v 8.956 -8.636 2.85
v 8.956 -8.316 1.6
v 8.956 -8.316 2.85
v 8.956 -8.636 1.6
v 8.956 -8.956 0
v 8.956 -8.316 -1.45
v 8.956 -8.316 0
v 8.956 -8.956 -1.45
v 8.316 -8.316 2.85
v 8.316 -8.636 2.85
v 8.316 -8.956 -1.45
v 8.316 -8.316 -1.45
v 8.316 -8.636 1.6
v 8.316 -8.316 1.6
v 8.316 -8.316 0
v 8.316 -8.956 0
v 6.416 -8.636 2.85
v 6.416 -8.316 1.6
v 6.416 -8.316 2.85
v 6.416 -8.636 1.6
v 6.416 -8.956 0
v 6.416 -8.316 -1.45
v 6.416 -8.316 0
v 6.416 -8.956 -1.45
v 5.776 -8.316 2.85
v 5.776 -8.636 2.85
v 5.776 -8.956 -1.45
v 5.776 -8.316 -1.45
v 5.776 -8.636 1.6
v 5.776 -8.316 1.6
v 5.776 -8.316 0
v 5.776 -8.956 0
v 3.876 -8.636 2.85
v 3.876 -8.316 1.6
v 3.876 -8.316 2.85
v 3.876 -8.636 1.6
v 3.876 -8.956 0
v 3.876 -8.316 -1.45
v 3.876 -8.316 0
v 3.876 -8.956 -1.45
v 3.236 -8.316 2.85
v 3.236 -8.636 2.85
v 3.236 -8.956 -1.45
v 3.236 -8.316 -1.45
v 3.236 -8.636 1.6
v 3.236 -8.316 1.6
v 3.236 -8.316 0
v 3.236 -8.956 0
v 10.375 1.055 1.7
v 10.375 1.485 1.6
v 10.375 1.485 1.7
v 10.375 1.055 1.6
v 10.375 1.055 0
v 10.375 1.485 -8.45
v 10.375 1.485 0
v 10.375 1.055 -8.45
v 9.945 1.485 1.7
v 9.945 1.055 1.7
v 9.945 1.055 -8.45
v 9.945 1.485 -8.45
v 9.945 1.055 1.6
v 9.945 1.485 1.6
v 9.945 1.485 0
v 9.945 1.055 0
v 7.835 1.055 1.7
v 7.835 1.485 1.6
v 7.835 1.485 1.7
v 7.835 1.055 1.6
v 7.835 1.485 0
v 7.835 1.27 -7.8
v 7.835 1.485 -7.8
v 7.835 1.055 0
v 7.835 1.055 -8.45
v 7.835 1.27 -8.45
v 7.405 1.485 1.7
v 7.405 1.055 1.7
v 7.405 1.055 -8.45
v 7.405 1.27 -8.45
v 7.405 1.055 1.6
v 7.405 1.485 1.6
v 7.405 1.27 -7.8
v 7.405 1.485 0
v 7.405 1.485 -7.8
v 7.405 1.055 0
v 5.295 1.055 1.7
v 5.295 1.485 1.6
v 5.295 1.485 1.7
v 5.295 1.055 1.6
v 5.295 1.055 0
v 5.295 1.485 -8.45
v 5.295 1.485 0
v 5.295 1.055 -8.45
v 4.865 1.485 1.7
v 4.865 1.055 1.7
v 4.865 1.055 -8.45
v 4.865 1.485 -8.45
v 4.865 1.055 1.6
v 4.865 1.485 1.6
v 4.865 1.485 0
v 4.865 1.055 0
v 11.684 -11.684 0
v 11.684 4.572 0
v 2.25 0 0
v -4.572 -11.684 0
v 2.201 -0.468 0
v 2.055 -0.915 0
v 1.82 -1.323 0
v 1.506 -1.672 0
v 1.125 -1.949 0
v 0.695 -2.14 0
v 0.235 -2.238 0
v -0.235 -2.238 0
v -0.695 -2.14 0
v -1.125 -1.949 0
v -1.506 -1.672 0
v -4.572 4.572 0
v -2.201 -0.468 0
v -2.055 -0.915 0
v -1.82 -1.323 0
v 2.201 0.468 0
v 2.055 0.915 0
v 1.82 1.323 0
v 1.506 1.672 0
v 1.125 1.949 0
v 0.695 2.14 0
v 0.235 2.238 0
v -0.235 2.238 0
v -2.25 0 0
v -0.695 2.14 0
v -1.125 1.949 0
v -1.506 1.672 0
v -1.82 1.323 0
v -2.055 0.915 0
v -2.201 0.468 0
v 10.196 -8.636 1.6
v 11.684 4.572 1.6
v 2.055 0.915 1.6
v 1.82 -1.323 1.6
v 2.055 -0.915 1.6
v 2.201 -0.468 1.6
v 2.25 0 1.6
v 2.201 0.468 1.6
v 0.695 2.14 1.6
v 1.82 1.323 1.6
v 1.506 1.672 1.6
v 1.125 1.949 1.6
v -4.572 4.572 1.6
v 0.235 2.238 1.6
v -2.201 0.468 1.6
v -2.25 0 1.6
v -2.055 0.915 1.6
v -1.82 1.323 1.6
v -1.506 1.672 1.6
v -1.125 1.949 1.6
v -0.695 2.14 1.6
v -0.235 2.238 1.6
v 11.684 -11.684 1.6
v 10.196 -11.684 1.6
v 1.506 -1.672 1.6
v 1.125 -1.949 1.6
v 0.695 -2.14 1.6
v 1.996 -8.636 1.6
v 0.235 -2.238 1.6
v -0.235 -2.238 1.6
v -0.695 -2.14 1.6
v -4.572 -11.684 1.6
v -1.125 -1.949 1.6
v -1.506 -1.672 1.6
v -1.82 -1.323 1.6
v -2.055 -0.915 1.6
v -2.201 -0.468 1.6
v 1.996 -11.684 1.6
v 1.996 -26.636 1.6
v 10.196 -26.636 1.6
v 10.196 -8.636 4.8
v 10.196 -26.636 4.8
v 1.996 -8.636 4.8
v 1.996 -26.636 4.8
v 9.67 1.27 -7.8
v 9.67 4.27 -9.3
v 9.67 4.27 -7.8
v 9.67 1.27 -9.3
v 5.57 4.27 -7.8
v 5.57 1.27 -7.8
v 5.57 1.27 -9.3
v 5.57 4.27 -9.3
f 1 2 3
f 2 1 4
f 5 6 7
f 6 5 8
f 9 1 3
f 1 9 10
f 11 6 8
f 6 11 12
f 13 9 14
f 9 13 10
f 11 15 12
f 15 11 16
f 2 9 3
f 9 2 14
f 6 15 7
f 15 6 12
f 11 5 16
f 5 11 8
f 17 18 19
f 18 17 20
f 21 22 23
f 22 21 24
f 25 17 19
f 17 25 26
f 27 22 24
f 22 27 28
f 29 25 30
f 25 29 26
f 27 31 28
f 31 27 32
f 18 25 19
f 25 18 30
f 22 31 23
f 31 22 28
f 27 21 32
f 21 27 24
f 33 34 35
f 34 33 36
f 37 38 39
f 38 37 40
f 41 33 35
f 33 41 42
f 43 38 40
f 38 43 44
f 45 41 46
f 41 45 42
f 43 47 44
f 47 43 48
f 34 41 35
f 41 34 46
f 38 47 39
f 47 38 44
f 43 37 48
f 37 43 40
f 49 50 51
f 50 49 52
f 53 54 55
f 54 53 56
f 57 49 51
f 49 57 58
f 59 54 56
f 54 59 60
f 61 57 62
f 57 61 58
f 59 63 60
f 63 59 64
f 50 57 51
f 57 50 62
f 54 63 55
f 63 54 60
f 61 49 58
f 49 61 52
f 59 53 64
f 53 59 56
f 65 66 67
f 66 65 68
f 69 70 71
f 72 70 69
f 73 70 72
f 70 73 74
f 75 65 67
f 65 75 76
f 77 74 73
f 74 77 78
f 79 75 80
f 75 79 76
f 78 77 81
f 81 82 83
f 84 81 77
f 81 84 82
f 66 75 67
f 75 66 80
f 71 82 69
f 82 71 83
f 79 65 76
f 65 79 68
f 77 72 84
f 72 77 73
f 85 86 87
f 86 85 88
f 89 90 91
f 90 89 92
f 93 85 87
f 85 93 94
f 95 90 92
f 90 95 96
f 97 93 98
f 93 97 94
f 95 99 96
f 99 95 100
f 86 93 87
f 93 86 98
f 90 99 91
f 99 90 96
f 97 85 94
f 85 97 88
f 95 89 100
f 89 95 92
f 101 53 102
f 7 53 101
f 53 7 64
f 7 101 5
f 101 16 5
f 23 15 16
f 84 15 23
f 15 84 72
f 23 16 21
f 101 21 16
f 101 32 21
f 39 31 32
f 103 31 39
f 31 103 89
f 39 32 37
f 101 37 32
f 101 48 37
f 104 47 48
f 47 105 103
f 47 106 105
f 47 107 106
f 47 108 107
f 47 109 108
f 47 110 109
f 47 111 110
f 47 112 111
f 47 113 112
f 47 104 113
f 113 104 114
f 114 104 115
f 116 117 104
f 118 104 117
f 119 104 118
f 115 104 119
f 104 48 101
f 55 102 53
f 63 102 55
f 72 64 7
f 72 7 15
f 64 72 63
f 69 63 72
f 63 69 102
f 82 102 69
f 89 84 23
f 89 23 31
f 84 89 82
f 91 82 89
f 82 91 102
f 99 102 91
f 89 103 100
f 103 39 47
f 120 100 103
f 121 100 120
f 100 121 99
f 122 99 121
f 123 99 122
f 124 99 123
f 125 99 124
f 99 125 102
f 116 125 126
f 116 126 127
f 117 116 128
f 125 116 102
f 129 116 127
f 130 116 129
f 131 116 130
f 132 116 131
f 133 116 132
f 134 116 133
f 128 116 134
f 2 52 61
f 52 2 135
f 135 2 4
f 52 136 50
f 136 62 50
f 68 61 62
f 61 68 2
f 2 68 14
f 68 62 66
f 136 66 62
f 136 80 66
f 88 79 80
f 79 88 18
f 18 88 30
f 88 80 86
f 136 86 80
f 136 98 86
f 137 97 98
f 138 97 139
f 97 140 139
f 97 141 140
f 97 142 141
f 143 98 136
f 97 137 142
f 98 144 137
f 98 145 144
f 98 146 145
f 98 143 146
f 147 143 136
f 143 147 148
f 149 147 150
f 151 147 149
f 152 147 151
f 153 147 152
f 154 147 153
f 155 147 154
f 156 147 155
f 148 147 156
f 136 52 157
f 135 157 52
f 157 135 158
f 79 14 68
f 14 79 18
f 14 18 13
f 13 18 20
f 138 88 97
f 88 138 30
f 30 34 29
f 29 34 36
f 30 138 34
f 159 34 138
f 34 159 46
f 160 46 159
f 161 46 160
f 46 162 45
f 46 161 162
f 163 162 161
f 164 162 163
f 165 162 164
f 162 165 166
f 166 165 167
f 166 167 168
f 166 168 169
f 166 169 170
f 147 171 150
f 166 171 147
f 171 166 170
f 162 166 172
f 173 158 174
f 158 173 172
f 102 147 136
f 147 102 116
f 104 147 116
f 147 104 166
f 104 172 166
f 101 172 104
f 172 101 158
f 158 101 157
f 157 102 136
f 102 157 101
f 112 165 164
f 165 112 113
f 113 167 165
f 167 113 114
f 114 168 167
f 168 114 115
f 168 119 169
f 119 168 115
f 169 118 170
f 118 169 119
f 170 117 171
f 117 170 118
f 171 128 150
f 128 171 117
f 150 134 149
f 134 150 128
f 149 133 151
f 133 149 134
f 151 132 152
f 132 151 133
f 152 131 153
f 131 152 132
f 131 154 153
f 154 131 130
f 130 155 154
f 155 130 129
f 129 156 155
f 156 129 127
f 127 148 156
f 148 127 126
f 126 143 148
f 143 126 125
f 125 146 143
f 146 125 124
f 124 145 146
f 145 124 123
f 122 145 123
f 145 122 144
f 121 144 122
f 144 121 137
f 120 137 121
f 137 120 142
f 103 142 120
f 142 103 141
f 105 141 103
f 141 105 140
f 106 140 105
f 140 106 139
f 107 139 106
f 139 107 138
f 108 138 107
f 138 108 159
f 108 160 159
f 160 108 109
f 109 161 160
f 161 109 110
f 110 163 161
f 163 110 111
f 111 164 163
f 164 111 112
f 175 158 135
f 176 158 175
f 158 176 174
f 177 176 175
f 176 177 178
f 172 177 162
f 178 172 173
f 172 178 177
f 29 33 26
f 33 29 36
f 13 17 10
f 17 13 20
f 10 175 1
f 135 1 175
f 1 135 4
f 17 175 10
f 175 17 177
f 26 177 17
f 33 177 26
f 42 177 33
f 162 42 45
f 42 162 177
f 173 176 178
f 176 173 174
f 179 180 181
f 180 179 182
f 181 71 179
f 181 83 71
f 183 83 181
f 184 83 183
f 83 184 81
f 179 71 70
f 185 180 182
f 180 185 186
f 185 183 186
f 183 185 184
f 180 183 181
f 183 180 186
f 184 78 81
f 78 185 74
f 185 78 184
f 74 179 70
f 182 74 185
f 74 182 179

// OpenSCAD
// file: 801f8c8ad5252d830007bc8fb8f76d3168990c0b1102200be74383be07b724a8.scad
/*
   Copyright 2018 Scott Bezek and the splitflap contributors

   Licensed under the Apache License, Version 2.0 (the "License");
   you may not use this file except in compliance with the License.
   You may obtain a copy of the License at

       http://www.apache.org/licenses/LICENSE-2.0

   Unless required by applicable law or agreed to in writing, software
   distributed under the License is distributed on an "AS IS" BASIS,
   WITHOUT WARRANTIES OR CONDITIONS OF ANY KIND, either express or implied.
   See the License for the specific language governing permissions and
   limitations under the License.
*/

include <3a8aa1ee2c5f15af7c9a4d3d95d6786cd3b11c8e1af2661494beaac4b8dd79fa.scad>;

pcb_thickness = 1.6;
sensor_spool_distance = 0.70;  // distance from the sensor to the face of the spool

// From datasheet:
hall_effect_height = (2.8 + 3.2) / 2;
hall_effect_width = (3.9 + 4.3) / 2;
hall_effect_thickness = (1.40 + 1.60) / 2;
hall_effect_sensor_offset_y = hall_effect_height - 1.25;
hall_effect_pin_length_max = 14.5;

// From sensor.kicad_pcb:
pcb_height = 16.256;
pcb_length = 16.256;
pcb_hole_to_sensor_pin_1_x = 10.16;
pcb_hole_to_sensor_pin_1_y = 1.27;
sensor_pin_pitch = 2.54;
pcb_hole_to_connector_pin_1_x = 8.636;
pcb_hole_to_connector_pin_1_y = 8.636;
connector_pin_pitch = 2.54;
pcb_edge_to_hole_x = 4.572;
pcb_edge_to_hole_y = 4.572;

pcb_adjustment_range = 4;
pcb_hole_radius = m4_hole_diameter/2;

// Jig dimensions
pcb_jig_corner_fillet = 2;
pcb_jig_align_thickness = 2;
pcb_jig_align_length = 0;  // past the PCB thickness
pcb_jig_align_clearance = 0.25;  // on x, around the PCB
pcb_jig_depth_clearance = 0.1;  // on y, from sensor to jig


// Computed dimensions
pcb_hole_to_sensor_x = pcb_hole_to_sensor_pin_1_x - sensor_pin_pitch;
pcb_hole_to_sensor_y = pcb_hole_to_sensor_pin_1_y + hall_effect_sensor_offset_y;


// Rough numbers for 3d rendering only (non-critical dimensions)
pcb_connector_height = 3.2;
pcb_connector_width = 8.2;
pcb_connector_length = 18;
pcb_connector_pin_width = 0.64;
pcb_connector_pin_slop = 0.4;
pcb_connector_pin_tail_length = 3.05 + 2.5/2;

pcb_sensor_pin_width = 0.43;

module color_extractor(c) {
    echo(extracted_color=c);
    children();
}
// file: 3a8aa1ee2c5f15af7c9a4d3d95d6786cd3b11c8e1af2661494beaac4b8dd79fa.scad
/*
   Copyright 2015-2018 Scott Bezek and the splitflap contributors

   Licensed under the Apache License, Version 2.0 (the "License");
   you may not use this file except in compliance with the License.
   You may obtain a copy of the License at

       http://www.apache.org/licenses/LICENSE-2.0

   Unless required by applicable law or agreed to in writing, software
   distributed under the License is distributed on an "AS IS" BASIS,
   WITHOUT WARRANTIES OR CONDITIONS OF ANY KIND, either express or implied.
   See the License for the specific language governing permissions and
   limitations under the License.
*/

// M4 bolts
m4_hole_diameter = 4.5;
m4_bolt_length = 10;
m4_button_head_diameter = 7.6 + .2;
m4_button_head_length = 2.2 + .2;
m4_nut_width_flats = 7 + .2;
m4_nut_width_corners = 7/cos(180/6);
m4_nut_width_corners_padded = m4_nut_width_corners + .2;
m4_nut_length = 3.2;
m4_nut_length_padded = m4_nut_length + .2;


module color_extractor(c) {
    echo(extracted_color=c);
    children();
}
// main file
/*
   Copyright 2015-2018 Scott Bezek and the splitflap contributors

   Licensed under the Apache License, Version 2.0 (the "License");
   you may not use this file except in compliance with the License.
   You may obtain a copy of the License at

       http://www.apache.org/licenses/LICENSE-2.0

   Unless required by applicable law or agreed to in writing, software
   distributed under the License is distributed on an "AS IS" BASIS,
   WITHOUT WARRANTIES OR CONDITIONS OF ANY KIND, either express or implied.
   See the License for the specific language governing permissions and
   limitations under the License.
*/
include <3a8aa1ee2c5f15af7c9a4d3d95d6786cd3b11c8e1af2661494beaac4b8dd79fa.scad>;
include <801f8c8ad5252d830007bc8fb8f76d3168990c0b1102200be74383be07b724a8.scad>;


module pcb_outline_2d(hole=true) {
    difference() {
        translate([-pcb_edge_to_hole_x, -pcb_height + pcb_edge_to_hole_y]) {
            square([pcb_length, pcb_height]);
        }
        if(hole) {
            circle(r=m4_hole_diameter/2, $fn=30);
        }
    }
}

// 3D PCB module, origin at the center of the mounting hole on the bottom surface of the PCB
module pcb(pcb_to_spool, render_jig=false, jig_thickness=0) {
     color_extractor([0, 0.5, 0]) {
        linear_extrude(height=pcb_thickness) {
            pcb_outline_2d();
        }
    }

    // Connector
     color_extractor([0, 0, 0]) {
        translate([pcb_hole_to_connector_pin_1_x - connector_pin_pitch - pcb_connector_width/2, -pcb_hole_to_connector_pin_1_y - pcb_connector_length, pcb_thickness]) {
            cube([pcb_connector_width, pcb_connector_length, pcb_connector_height]);
        }
    }

    // Connector pins
     color_extractor([0.5, 0.5, 0.5]) {
        translate([pcb_hole_to_connector_pin_1_x - pcb_connector_pin_width/2, -pcb_hole_to_connector_pin_1_y - pcb_connector_pin_width/2, -pcb_connector_pin_tail_length + pcb_thickness + 2.5/2]) {
            cube([pcb_connector_pin_width, pcb_connector_pin_width, pcb_connector_pin_tail_length]);
            translate([-connector_pin_pitch, 0, 0]) {
                cube([pcb_connector_pin_width, pcb_connector_pin_width, pcb_connector_pin_tail_length]);
            }
            translate([-connector_pin_pitch * 2, 0, 0]) {
                cube([pcb_connector_pin_width, pcb_connector_pin_width, pcb_connector_pin_tail_length]);
            }
        }
    }

    // Sensor pins
     color_extractor([0.5, 0.5, 0.5]) {
        pin_extra_length = 0.1;  // pins excess sticking out from the back of the PCB
        sensor_z_offset = pcb_to_spool - sensor_spool_distance - hall_effect_thickness/2 - 0.1;
        sensor_pin_length = sensor_z_offset + pcb_thickness + pin_extra_length;
        assert(sensor_pin_length < hall_effect_pin_length_max, "Warning: design is too thick to fit sensor");

        translate([pcb_hole_to_sensor_pin_1_x - pcb_sensor_pin_width/2, pcb_hole_to_sensor_pin_1_y - pcb_sensor_pin_width/2, -sensor_z_offset]) {
            cube([pcb_sensor_pin_width, pcb_sensor_pin_width, sensor_pin_length]);
            translate([-sensor_pin_pitch, 0, 0]) {
                cube([pcb_sensor_pin_width, pcb_sensor_pin_width, sensor_pin_length]);
            }
            translate([-sensor_pin_pitch * 2, 0, 0]) {
                cube([pcb_sensor_pin_width, pcb_sensor_pin_width, sensor_pin_length]);
            }
        }
    }

    // Sensor body
     color_extractor([0, 0, 0]) {
        translate([pcb_hole_to_sensor_pin_1_x - sensor_pin_pitch - hall_effect_width/2, pcb_hole_to_sensor_pin_1_y, -pcb_to_spool + sensor_spool_distance]) {
            cube([hall_effect_width, hall_effect_height, hall_effect_thickness]);
        }
    }

    // Jig
    if(render_jig) {
         color_extractor([1, 1, 0])
        translate([-pcb_edge_to_hole_x - pcb_jig_align_thickness - pcb_jig_align_clearance, pcb_hole_to_sensor_pin_1_y + pcb_sensor_pin_width/2 + thickness, -pcb_to_sensor(pcb_to_spool) + pcb_jig_depth_clearance])
        rotate([90, 0, 0])
            sensor_jig(pcb_to_spool, jig_thickness);
    }
}

// 2D cutouts needed to mount the PCB module, origin at the center of the mounting hole
module pcb_cutouts(adjustment_range=pcb_adjustment_range) {
    hull_slide(delta=adjustment_range) {
        // Bolt slot
        hull() {
            circle(r=m4_hole_diameter/2, $fn=30);
            translate([pcb_hole_to_sensor_pin_1_x + sensor_pin_pitch - m4_hole_diameter/2, 0, 0])
                circle(r=m4_hole_diameter/2, $fn=30);
        }
        // Pin header slot
        translate([pcb_hole_to_connector_pin_1_x - connector_pin_pitch, -pcb_hole_to_connector_pin_1_y]) {
            hull() {
                pin_slot_height = pcb_connector_pin_width + pcb_connector_pin_slop;
                pin_slot_width = connector_pin_pitch * 4 - pin_slot_height;
                translate([pin_slot_width/2, 0, 0])
                    circle(pin_slot_height/2, $fn=15);
                translate([-pin_slot_width/2, 0, 0])
                    circle(pin_slot_height/2, $fn=15);
            }
        }
    }
}

module hull_slide(delta) {
    for (i = [0:$children - 1]) {
        hull() {
            translate([-delta, 0]) {
                children(i);
            }
            translate([delta, 0]) {
                children(i);
            }
        }
    }
}

function pcb_to_sensor(pcb_to_spool) = pcb_to_spool - sensor_spool_distance - hall_effect_thickness;  // using sensor rear face
function pcb_hole_to_sensor_x() = pcb_hole_to_sensor_x;
function pcb_hole_to_sensor_y() = pcb_hole_to_sensor_y;
function pcb_thickness() = pcb_thickness;
function sensor_jig_height(pcb_to_spool) = pcb_to_sensor(pcb_to_spool) - pcb_jig_depth_clearance + pcb_jig_align_length + pcb_thickness;
function sensor_jig_width(pcb_to_spool) = pcb_length + (pcb_jig_align_thickness + pcb_jig_align_clearance) * 2;

module sensor_jig(pcb_to_spool, thickness) {
    module fillet() {
        eps = 0.01;
        difference() {
            translate([-eps, -eps, 0])
                square(pcb_jig_corner_fillet + eps);
            translate([pcb_jig_corner_fillet, pcb_jig_corner_fillet, 0])
                circle(r=pcb_jig_corner_fillet, $fn=20);
        }
    }

    linear_extrude(thickness) {
        difference() {
        union() {
            square([sensor_jig_width(pcb_to_spool), pcb_to_sensor(pcb_to_spool) - pcb_jig_depth_clearance]);  // main body
            square([pcb_jig_align_thickness, sensor_jig_height(pcb_to_spool)]);  // alignment edge, left
            translate([sensor_jig_width(pcb_to_spool) - pcb_jig_align_thickness, 0])
            square([pcb_jig_align_thickness, sensor_jig_height(pcb_to_spool)]);  // alignment edge, right
        }
        fillet();
        mirror([1, 0, 0])
            translate([-sensor_jig_width(pcb_to_spool), 0, 0])
                fillet();
        }
    }
}

// Example usage:
pcb(10);

module color_extractor(c) {
    echo(extracted_color=c);
    children();
}
